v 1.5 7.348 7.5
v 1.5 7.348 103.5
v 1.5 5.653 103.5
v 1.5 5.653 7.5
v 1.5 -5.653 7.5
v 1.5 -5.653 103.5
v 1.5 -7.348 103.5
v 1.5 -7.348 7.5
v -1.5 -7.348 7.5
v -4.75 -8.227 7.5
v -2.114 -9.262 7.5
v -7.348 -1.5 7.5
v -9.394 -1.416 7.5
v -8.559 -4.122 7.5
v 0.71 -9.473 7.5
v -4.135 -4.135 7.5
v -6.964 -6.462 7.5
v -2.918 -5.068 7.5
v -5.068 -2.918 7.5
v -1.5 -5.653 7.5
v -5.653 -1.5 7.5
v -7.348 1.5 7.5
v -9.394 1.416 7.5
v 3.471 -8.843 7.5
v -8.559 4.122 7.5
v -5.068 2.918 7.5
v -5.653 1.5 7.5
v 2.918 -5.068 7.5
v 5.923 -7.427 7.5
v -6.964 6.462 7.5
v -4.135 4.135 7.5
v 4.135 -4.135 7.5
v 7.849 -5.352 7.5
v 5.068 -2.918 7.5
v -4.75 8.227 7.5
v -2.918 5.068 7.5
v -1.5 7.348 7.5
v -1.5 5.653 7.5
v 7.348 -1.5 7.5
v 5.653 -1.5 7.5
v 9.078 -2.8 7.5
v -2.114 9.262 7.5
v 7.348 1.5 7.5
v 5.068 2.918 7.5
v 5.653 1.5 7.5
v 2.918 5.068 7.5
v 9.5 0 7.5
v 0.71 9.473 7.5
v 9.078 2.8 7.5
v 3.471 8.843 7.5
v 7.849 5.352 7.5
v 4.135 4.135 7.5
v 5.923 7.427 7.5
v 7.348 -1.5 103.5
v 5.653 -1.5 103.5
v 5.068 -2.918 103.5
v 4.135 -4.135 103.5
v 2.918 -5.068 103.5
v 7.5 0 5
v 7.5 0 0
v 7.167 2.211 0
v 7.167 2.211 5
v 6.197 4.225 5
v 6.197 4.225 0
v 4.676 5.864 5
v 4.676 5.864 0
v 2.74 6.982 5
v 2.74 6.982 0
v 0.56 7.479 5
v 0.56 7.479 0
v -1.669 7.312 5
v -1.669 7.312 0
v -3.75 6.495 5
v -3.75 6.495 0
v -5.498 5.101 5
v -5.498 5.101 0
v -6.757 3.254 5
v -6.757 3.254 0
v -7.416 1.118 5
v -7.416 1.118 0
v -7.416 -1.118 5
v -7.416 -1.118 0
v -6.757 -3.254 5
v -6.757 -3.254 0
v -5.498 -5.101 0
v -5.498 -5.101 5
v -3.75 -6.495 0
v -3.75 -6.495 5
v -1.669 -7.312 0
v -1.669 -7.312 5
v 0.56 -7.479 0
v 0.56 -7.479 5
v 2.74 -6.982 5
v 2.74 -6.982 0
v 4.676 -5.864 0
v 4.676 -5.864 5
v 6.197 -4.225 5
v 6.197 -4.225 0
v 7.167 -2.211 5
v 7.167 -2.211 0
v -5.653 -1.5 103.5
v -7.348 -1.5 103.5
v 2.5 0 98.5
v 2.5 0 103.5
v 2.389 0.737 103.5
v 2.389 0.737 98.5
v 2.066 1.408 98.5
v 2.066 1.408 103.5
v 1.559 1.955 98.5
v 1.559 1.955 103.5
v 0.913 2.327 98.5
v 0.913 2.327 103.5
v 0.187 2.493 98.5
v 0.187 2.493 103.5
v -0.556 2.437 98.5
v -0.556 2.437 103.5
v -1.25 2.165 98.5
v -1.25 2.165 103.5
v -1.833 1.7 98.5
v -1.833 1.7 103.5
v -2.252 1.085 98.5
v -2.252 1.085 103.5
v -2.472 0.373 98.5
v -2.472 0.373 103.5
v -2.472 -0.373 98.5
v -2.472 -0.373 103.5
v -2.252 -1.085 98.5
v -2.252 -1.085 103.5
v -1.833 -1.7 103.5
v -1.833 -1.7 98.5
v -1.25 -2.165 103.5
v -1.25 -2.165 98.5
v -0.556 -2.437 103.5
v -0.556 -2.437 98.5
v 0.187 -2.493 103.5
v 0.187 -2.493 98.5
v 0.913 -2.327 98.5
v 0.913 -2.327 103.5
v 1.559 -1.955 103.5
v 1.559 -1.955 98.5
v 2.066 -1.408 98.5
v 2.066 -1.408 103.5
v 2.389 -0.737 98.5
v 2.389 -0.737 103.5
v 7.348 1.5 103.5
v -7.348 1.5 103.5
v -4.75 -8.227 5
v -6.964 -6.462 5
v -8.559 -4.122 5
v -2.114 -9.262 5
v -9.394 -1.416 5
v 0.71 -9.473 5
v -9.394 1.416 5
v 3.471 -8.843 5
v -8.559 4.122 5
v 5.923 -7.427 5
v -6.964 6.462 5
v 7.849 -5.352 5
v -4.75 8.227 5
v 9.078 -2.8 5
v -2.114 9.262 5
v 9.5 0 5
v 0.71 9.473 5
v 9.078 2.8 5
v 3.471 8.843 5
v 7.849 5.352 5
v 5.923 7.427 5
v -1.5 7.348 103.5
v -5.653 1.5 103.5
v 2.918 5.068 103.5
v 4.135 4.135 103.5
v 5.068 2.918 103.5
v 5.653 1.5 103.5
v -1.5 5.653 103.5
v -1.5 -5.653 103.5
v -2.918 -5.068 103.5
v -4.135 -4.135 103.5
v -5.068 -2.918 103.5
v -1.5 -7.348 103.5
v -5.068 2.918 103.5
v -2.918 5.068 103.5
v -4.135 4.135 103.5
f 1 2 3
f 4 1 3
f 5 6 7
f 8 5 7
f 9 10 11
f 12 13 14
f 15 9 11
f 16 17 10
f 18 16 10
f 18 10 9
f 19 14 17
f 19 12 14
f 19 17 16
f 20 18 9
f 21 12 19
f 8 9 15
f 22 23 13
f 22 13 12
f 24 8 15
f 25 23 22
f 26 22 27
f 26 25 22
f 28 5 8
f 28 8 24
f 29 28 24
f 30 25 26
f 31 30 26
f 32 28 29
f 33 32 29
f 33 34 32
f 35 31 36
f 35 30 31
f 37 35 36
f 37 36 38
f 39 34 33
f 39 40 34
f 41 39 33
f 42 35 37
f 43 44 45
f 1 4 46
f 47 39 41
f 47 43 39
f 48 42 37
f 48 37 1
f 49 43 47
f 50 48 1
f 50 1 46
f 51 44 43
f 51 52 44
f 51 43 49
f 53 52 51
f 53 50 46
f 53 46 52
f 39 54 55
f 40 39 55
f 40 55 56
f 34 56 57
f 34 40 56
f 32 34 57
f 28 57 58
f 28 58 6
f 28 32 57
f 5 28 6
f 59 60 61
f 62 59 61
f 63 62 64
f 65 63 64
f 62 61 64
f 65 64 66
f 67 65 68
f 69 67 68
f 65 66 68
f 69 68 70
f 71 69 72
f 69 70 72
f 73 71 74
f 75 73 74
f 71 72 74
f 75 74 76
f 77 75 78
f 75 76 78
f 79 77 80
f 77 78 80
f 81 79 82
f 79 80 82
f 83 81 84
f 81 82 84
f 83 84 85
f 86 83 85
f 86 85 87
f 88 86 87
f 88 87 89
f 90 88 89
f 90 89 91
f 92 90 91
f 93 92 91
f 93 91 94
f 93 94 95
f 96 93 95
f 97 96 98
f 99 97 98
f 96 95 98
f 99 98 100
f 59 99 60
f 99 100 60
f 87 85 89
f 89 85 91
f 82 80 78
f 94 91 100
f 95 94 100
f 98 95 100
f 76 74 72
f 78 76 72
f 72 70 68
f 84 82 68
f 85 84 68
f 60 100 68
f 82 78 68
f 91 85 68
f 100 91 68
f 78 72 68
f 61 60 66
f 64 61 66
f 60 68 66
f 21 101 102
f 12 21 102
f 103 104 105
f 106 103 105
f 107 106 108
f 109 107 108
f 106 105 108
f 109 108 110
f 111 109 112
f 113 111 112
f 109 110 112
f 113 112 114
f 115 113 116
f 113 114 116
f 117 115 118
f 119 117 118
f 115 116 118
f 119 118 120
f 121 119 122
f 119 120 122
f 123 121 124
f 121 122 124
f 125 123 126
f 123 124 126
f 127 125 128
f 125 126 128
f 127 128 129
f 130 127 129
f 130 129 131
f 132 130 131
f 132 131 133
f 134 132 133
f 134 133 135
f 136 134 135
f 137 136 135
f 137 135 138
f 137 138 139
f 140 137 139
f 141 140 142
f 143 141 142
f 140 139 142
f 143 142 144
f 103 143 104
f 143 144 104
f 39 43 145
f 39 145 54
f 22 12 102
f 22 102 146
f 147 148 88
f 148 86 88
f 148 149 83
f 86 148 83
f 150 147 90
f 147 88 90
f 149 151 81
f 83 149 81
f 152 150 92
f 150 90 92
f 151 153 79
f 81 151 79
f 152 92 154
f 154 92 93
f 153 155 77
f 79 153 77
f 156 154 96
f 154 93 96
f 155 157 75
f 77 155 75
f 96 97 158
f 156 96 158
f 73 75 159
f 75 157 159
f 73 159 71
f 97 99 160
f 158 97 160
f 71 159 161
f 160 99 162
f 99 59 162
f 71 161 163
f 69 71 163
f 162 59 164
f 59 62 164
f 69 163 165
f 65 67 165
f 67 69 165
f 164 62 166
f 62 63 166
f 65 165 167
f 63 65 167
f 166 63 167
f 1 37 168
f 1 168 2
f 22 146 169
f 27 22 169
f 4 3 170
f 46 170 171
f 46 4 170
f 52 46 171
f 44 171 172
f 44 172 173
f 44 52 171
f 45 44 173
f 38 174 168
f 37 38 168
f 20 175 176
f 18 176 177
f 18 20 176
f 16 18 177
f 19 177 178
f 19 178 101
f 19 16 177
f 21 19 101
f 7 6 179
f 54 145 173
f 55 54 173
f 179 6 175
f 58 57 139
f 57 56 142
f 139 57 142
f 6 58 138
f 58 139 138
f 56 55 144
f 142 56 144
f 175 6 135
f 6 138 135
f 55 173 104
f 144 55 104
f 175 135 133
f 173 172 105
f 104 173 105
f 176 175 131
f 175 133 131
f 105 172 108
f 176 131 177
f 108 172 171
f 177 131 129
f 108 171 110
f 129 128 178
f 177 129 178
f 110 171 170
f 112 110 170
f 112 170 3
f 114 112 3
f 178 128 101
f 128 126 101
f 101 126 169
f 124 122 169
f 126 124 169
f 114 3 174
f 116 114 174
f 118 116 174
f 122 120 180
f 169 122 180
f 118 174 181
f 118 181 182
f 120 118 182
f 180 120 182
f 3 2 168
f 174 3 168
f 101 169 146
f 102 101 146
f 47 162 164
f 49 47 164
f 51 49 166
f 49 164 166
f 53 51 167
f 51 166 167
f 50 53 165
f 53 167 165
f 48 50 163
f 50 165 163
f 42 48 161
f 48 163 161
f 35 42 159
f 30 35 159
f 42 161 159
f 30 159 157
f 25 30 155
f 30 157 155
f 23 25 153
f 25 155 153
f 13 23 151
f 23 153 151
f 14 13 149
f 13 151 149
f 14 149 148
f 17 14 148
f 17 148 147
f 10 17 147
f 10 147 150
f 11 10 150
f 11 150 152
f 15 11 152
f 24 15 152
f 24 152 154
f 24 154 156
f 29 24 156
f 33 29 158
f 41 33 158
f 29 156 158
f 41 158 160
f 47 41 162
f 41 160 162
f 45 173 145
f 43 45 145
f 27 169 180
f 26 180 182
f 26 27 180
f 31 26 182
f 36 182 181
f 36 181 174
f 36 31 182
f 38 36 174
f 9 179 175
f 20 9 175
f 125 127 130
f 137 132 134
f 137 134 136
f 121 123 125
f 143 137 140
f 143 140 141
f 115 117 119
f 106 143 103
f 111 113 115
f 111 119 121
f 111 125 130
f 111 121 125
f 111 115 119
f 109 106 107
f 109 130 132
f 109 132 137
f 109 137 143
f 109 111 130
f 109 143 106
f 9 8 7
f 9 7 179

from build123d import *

# Parameters (mm, degrees)
SKETCH1_R           = 7.5
BOSS_EXTRUDE1_DEPTH = 5
SKETCH3_R           = 9.5
BOSS_EXTRUDE2_DEPTH = 2.5
BOSS_EXTRUDE3_DEPTH = 96
SKETCH5_R           = 2.5
CUT_EXTRUDE1_DEPTH  = 5


with BuildPart() as part:
    # Sketch1 → Boss-Extrude1 (new body)
    with BuildSketch(Plane.XY):
        Circle(SKETCH1_R)
    extrude(amount=BOSS_EXTRUDE1_DEPTH)

    # Sketch3 → Boss-Extrude2 (add)
    with BuildSketch(Plane.XY.offset(5)):
        Circle(SKETCH3_R)
    extrude(amount=BOSS_EXTRUDE2_DEPTH)

    # Sketch4 → Boss-Extrude3 (add)
    with BuildSketch(Plane.XY.offset(7.5)):
        with BuildLine():
            Line((-1.5, 5.652839314), (-1.5, 7.348469228))
            Line((-1.5, 7.348469228), (1.5, 7.348469228))
            Line((1.5, 7.348469228), (1.5, 5.652839314))
            ThreePointArc((1.5, 5.652839314), (4.135492251, 4.135492251), (5.652839314, 1.5))
            Line((5.652839314, 1.5), (7.348469228, 1.5))
            Line((7.348469228, 1.5), (7.348469228, -1.5))
            Line((7.348469228, -1.5), (5.652839314, -1.5))
            ThreePointArc((5.652839314, -1.5), (4.135492251, -4.135492251), (1.5, -5.652839314))
            Line((1.5, -5.652839314), (1.5, -7.348469228))
            Line((1.5, -7.348469228), (-1.5, -7.348469228))
            Line((-1.5, -7.348469228), (-1.5, -5.652839314))
            ThreePointArc((-1.5, -5.652839314), (-4.135492251, -4.135492251), (-5.652839314, -1.5))
            Line((-5.652839314, -1.5), (-7.348469228, -1.5))
            Line((-7.348469228, -1.5), (-7.348469228, 1.5))
            Line((-7.348469228, 1.5), (-5.652839314, 1.5))
            ThreePointArc((-5.652839314, 1.5), (-4.135492251, 4.135492251), (-1.5, 5.652839314))
        make_face()
    extrude(amount=BOSS_EXTRUDE3_DEPTH)

    # Sketch5 → Cut-Extrude1 (cut)
    with BuildSketch(Plane.XY.offset(103.5)):
        Circle(SKETCH5_R)
    extrude(amount=-CUT_EXTRUDE1_DEPTH, mode=Mode.SUBTRACT)


solid = part.part
